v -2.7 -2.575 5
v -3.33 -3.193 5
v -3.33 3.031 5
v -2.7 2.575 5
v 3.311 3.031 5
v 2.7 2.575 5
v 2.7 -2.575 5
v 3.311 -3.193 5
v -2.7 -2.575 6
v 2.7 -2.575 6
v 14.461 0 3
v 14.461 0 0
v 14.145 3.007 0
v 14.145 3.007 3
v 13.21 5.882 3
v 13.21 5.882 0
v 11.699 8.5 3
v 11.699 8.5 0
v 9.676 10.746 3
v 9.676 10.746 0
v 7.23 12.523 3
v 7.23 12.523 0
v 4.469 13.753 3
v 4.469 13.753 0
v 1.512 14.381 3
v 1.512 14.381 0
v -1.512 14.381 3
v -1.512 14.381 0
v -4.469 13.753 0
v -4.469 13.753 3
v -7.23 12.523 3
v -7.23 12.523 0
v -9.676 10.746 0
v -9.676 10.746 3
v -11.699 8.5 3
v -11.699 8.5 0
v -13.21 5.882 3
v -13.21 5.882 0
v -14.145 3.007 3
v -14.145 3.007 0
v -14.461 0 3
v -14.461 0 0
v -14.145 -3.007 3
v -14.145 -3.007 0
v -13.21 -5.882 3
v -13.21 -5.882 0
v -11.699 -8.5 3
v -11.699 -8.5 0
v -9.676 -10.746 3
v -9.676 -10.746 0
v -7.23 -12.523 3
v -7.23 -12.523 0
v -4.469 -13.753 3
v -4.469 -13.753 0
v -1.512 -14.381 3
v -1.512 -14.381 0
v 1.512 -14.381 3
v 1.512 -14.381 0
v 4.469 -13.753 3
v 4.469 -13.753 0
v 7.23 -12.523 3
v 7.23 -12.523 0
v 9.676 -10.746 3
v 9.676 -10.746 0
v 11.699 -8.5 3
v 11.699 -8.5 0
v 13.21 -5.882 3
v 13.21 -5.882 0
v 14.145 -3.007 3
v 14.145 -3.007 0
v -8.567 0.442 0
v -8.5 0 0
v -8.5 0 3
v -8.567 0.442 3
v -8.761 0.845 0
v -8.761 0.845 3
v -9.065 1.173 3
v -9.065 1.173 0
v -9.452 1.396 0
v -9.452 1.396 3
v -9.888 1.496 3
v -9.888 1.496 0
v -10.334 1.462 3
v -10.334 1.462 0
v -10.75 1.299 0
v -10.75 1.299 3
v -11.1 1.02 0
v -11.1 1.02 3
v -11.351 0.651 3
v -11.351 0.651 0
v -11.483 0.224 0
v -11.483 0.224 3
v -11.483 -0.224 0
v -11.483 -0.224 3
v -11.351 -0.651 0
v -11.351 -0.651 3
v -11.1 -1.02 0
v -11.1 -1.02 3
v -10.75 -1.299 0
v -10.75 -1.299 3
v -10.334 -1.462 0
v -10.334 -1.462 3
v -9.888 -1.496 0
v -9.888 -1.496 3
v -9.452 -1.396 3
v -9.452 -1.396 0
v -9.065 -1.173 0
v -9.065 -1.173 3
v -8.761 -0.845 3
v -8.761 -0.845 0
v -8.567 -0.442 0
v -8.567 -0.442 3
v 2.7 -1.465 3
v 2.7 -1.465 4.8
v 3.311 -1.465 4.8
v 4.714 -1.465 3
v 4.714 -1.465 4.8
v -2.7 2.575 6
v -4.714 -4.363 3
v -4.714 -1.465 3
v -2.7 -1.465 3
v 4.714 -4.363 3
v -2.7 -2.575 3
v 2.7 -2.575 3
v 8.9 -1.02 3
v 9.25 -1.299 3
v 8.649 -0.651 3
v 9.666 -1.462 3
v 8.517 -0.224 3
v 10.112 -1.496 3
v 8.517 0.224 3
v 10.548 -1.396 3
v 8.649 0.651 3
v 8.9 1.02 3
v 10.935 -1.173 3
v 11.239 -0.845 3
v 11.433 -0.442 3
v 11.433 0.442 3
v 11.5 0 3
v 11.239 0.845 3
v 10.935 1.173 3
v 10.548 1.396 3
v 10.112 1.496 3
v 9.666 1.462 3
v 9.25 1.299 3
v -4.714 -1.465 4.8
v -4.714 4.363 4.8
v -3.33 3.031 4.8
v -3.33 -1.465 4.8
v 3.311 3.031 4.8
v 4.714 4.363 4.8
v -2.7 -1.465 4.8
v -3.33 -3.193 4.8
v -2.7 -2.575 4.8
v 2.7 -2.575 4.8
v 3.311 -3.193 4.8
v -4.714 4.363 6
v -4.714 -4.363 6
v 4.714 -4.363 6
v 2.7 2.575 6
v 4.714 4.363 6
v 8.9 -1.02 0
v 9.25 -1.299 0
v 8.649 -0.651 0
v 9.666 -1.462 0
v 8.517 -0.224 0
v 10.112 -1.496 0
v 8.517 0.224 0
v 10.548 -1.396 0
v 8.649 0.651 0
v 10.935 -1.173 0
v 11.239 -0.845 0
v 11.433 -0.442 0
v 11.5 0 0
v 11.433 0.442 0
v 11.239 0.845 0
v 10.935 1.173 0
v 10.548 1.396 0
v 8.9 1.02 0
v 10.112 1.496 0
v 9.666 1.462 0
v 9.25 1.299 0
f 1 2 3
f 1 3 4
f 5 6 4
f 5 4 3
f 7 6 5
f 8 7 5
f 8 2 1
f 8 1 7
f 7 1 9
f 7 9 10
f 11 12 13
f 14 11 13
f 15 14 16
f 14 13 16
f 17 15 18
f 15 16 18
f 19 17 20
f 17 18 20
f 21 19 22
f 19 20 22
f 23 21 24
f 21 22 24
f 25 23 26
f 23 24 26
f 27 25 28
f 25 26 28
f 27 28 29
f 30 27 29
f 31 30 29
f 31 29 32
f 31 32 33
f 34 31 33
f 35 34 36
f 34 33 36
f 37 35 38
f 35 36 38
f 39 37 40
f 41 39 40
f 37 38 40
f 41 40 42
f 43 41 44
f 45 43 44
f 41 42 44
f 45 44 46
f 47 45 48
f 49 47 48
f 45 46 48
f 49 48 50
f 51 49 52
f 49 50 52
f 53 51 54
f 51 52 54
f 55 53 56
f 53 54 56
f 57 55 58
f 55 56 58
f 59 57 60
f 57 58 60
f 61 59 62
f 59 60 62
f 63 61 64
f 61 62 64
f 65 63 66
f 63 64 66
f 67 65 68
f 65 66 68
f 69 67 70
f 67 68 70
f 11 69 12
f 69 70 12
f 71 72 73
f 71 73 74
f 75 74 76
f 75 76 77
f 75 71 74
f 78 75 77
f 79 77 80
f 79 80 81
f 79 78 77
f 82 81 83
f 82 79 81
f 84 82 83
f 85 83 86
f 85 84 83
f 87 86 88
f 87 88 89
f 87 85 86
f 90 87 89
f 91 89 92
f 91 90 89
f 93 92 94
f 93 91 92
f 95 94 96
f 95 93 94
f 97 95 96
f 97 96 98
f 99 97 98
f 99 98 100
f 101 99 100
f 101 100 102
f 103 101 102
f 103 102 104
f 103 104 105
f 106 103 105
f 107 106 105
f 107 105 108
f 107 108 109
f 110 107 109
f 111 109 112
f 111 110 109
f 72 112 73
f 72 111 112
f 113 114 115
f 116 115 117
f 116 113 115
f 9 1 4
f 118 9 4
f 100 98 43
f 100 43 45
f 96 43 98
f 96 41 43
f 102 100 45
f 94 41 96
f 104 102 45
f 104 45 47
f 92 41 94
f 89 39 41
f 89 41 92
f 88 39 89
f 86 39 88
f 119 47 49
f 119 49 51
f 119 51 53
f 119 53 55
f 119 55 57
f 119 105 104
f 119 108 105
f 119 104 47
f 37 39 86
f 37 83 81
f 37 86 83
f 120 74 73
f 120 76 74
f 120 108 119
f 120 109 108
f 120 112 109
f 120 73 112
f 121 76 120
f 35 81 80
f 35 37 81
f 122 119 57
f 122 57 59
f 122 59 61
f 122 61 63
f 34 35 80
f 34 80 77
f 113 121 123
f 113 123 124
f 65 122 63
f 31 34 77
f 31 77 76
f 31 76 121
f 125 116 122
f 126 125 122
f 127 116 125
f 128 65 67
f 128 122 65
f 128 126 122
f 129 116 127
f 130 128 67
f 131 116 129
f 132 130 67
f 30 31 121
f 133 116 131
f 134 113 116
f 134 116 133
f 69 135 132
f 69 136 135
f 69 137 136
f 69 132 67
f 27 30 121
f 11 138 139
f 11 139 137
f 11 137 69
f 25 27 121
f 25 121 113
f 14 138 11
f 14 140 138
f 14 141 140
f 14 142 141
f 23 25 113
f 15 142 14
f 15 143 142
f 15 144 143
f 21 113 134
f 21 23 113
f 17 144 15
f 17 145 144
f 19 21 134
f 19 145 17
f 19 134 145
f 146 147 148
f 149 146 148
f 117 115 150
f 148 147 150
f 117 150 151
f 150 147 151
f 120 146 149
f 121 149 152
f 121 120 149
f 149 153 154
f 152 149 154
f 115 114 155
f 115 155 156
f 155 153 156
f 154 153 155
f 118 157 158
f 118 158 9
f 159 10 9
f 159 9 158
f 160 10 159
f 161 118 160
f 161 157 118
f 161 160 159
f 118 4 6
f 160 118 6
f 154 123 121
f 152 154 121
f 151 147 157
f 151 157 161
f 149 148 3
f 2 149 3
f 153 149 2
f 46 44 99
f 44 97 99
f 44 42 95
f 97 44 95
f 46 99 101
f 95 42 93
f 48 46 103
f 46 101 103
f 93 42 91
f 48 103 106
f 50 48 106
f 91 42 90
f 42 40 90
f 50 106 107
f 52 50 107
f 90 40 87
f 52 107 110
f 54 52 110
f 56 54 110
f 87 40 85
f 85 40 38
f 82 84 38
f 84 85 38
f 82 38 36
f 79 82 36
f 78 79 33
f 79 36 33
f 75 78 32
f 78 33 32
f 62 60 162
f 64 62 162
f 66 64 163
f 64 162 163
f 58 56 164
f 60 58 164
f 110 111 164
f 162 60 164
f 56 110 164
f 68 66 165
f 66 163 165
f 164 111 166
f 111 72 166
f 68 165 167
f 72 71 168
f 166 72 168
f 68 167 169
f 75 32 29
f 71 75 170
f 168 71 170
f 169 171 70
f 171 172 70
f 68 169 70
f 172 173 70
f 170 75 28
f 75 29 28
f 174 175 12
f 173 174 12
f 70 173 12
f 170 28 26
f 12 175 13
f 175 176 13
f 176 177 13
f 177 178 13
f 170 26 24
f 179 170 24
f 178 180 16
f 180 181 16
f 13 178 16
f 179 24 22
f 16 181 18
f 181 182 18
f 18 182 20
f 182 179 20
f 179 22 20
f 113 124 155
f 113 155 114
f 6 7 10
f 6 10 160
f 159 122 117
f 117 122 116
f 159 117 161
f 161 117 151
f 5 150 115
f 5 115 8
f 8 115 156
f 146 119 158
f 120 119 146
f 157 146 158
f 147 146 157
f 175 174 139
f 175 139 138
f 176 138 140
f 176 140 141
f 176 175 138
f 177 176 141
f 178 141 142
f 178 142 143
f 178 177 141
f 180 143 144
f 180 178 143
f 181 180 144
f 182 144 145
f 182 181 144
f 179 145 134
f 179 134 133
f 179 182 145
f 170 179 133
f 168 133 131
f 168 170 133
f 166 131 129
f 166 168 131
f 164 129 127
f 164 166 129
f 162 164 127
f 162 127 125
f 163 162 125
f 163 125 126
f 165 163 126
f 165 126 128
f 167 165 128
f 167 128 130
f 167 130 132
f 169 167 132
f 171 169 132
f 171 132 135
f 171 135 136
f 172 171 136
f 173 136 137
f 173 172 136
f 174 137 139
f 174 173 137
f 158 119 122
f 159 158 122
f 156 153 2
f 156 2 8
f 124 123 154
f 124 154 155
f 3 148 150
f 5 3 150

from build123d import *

# Parameters (mm, degrees)
F0_R     = 14.460691
F0_R_2   = 1.5
F1_DEPTH = 3
F2_W     = 9.428674
F2_H     = 8.726458
F2_W_2   = 5.4
F2_H_2   = 5.150138
F3_DEPTH = 3
F4_W     = 15.93314
F4_H     = 7.691861
F5_DEPTH = 1.8
F6_W     = 6.640965
F6_H     = 6.223533
F7_DEPTH = 0.2


with BuildPart() as f1:
    # F0 (on Top) → F1 (new body)
    with BuildSketch(Plane.XY):
        Circle(F0_R)
        with Locations((-10, 0)):
            Circle(F0_R_2, mode=Mode.SUBTRACT)
        with Locations((10, 0)):
            Circle(F0_R_2, mode=Mode.SUBTRACT)
    extrude(amount=F1_DEPTH)

    # F2 (on face) → F3 (join)
    with BuildSketch(Plane.XY.offset(3)):
        Rectangle(F2_W, F2_H)
        Rectangle(F2_W_2, F2_H_2, mode=Mode.SUBTRACT)
    extrude(amount=F3_DEPTH)

    # F4 (on face) → F5 (cut)
    with BuildSketch(Plane.XY.offset(3)):
        with Locations((-0.366279, 2.380814)):
            Rectangle(F4_W, F4_H)
    extrude(amount=F5_DEPTH, mode=Mode.SUBTRACT)

    # F6 (on face) → F7 (cut)
    with BuildSketch(Plane(origin=(0, 0, 4.8), x_dir=(1, 0, 0), z_dir=(0, 0, -1))):
        with Locations((-0.009842, 0.080773)):
            Rectangle(F6_W, F6_H)
    extrude(amount=-F7_DEPTH, mode=Mode.SUBTRACT)


solid = f1.part
